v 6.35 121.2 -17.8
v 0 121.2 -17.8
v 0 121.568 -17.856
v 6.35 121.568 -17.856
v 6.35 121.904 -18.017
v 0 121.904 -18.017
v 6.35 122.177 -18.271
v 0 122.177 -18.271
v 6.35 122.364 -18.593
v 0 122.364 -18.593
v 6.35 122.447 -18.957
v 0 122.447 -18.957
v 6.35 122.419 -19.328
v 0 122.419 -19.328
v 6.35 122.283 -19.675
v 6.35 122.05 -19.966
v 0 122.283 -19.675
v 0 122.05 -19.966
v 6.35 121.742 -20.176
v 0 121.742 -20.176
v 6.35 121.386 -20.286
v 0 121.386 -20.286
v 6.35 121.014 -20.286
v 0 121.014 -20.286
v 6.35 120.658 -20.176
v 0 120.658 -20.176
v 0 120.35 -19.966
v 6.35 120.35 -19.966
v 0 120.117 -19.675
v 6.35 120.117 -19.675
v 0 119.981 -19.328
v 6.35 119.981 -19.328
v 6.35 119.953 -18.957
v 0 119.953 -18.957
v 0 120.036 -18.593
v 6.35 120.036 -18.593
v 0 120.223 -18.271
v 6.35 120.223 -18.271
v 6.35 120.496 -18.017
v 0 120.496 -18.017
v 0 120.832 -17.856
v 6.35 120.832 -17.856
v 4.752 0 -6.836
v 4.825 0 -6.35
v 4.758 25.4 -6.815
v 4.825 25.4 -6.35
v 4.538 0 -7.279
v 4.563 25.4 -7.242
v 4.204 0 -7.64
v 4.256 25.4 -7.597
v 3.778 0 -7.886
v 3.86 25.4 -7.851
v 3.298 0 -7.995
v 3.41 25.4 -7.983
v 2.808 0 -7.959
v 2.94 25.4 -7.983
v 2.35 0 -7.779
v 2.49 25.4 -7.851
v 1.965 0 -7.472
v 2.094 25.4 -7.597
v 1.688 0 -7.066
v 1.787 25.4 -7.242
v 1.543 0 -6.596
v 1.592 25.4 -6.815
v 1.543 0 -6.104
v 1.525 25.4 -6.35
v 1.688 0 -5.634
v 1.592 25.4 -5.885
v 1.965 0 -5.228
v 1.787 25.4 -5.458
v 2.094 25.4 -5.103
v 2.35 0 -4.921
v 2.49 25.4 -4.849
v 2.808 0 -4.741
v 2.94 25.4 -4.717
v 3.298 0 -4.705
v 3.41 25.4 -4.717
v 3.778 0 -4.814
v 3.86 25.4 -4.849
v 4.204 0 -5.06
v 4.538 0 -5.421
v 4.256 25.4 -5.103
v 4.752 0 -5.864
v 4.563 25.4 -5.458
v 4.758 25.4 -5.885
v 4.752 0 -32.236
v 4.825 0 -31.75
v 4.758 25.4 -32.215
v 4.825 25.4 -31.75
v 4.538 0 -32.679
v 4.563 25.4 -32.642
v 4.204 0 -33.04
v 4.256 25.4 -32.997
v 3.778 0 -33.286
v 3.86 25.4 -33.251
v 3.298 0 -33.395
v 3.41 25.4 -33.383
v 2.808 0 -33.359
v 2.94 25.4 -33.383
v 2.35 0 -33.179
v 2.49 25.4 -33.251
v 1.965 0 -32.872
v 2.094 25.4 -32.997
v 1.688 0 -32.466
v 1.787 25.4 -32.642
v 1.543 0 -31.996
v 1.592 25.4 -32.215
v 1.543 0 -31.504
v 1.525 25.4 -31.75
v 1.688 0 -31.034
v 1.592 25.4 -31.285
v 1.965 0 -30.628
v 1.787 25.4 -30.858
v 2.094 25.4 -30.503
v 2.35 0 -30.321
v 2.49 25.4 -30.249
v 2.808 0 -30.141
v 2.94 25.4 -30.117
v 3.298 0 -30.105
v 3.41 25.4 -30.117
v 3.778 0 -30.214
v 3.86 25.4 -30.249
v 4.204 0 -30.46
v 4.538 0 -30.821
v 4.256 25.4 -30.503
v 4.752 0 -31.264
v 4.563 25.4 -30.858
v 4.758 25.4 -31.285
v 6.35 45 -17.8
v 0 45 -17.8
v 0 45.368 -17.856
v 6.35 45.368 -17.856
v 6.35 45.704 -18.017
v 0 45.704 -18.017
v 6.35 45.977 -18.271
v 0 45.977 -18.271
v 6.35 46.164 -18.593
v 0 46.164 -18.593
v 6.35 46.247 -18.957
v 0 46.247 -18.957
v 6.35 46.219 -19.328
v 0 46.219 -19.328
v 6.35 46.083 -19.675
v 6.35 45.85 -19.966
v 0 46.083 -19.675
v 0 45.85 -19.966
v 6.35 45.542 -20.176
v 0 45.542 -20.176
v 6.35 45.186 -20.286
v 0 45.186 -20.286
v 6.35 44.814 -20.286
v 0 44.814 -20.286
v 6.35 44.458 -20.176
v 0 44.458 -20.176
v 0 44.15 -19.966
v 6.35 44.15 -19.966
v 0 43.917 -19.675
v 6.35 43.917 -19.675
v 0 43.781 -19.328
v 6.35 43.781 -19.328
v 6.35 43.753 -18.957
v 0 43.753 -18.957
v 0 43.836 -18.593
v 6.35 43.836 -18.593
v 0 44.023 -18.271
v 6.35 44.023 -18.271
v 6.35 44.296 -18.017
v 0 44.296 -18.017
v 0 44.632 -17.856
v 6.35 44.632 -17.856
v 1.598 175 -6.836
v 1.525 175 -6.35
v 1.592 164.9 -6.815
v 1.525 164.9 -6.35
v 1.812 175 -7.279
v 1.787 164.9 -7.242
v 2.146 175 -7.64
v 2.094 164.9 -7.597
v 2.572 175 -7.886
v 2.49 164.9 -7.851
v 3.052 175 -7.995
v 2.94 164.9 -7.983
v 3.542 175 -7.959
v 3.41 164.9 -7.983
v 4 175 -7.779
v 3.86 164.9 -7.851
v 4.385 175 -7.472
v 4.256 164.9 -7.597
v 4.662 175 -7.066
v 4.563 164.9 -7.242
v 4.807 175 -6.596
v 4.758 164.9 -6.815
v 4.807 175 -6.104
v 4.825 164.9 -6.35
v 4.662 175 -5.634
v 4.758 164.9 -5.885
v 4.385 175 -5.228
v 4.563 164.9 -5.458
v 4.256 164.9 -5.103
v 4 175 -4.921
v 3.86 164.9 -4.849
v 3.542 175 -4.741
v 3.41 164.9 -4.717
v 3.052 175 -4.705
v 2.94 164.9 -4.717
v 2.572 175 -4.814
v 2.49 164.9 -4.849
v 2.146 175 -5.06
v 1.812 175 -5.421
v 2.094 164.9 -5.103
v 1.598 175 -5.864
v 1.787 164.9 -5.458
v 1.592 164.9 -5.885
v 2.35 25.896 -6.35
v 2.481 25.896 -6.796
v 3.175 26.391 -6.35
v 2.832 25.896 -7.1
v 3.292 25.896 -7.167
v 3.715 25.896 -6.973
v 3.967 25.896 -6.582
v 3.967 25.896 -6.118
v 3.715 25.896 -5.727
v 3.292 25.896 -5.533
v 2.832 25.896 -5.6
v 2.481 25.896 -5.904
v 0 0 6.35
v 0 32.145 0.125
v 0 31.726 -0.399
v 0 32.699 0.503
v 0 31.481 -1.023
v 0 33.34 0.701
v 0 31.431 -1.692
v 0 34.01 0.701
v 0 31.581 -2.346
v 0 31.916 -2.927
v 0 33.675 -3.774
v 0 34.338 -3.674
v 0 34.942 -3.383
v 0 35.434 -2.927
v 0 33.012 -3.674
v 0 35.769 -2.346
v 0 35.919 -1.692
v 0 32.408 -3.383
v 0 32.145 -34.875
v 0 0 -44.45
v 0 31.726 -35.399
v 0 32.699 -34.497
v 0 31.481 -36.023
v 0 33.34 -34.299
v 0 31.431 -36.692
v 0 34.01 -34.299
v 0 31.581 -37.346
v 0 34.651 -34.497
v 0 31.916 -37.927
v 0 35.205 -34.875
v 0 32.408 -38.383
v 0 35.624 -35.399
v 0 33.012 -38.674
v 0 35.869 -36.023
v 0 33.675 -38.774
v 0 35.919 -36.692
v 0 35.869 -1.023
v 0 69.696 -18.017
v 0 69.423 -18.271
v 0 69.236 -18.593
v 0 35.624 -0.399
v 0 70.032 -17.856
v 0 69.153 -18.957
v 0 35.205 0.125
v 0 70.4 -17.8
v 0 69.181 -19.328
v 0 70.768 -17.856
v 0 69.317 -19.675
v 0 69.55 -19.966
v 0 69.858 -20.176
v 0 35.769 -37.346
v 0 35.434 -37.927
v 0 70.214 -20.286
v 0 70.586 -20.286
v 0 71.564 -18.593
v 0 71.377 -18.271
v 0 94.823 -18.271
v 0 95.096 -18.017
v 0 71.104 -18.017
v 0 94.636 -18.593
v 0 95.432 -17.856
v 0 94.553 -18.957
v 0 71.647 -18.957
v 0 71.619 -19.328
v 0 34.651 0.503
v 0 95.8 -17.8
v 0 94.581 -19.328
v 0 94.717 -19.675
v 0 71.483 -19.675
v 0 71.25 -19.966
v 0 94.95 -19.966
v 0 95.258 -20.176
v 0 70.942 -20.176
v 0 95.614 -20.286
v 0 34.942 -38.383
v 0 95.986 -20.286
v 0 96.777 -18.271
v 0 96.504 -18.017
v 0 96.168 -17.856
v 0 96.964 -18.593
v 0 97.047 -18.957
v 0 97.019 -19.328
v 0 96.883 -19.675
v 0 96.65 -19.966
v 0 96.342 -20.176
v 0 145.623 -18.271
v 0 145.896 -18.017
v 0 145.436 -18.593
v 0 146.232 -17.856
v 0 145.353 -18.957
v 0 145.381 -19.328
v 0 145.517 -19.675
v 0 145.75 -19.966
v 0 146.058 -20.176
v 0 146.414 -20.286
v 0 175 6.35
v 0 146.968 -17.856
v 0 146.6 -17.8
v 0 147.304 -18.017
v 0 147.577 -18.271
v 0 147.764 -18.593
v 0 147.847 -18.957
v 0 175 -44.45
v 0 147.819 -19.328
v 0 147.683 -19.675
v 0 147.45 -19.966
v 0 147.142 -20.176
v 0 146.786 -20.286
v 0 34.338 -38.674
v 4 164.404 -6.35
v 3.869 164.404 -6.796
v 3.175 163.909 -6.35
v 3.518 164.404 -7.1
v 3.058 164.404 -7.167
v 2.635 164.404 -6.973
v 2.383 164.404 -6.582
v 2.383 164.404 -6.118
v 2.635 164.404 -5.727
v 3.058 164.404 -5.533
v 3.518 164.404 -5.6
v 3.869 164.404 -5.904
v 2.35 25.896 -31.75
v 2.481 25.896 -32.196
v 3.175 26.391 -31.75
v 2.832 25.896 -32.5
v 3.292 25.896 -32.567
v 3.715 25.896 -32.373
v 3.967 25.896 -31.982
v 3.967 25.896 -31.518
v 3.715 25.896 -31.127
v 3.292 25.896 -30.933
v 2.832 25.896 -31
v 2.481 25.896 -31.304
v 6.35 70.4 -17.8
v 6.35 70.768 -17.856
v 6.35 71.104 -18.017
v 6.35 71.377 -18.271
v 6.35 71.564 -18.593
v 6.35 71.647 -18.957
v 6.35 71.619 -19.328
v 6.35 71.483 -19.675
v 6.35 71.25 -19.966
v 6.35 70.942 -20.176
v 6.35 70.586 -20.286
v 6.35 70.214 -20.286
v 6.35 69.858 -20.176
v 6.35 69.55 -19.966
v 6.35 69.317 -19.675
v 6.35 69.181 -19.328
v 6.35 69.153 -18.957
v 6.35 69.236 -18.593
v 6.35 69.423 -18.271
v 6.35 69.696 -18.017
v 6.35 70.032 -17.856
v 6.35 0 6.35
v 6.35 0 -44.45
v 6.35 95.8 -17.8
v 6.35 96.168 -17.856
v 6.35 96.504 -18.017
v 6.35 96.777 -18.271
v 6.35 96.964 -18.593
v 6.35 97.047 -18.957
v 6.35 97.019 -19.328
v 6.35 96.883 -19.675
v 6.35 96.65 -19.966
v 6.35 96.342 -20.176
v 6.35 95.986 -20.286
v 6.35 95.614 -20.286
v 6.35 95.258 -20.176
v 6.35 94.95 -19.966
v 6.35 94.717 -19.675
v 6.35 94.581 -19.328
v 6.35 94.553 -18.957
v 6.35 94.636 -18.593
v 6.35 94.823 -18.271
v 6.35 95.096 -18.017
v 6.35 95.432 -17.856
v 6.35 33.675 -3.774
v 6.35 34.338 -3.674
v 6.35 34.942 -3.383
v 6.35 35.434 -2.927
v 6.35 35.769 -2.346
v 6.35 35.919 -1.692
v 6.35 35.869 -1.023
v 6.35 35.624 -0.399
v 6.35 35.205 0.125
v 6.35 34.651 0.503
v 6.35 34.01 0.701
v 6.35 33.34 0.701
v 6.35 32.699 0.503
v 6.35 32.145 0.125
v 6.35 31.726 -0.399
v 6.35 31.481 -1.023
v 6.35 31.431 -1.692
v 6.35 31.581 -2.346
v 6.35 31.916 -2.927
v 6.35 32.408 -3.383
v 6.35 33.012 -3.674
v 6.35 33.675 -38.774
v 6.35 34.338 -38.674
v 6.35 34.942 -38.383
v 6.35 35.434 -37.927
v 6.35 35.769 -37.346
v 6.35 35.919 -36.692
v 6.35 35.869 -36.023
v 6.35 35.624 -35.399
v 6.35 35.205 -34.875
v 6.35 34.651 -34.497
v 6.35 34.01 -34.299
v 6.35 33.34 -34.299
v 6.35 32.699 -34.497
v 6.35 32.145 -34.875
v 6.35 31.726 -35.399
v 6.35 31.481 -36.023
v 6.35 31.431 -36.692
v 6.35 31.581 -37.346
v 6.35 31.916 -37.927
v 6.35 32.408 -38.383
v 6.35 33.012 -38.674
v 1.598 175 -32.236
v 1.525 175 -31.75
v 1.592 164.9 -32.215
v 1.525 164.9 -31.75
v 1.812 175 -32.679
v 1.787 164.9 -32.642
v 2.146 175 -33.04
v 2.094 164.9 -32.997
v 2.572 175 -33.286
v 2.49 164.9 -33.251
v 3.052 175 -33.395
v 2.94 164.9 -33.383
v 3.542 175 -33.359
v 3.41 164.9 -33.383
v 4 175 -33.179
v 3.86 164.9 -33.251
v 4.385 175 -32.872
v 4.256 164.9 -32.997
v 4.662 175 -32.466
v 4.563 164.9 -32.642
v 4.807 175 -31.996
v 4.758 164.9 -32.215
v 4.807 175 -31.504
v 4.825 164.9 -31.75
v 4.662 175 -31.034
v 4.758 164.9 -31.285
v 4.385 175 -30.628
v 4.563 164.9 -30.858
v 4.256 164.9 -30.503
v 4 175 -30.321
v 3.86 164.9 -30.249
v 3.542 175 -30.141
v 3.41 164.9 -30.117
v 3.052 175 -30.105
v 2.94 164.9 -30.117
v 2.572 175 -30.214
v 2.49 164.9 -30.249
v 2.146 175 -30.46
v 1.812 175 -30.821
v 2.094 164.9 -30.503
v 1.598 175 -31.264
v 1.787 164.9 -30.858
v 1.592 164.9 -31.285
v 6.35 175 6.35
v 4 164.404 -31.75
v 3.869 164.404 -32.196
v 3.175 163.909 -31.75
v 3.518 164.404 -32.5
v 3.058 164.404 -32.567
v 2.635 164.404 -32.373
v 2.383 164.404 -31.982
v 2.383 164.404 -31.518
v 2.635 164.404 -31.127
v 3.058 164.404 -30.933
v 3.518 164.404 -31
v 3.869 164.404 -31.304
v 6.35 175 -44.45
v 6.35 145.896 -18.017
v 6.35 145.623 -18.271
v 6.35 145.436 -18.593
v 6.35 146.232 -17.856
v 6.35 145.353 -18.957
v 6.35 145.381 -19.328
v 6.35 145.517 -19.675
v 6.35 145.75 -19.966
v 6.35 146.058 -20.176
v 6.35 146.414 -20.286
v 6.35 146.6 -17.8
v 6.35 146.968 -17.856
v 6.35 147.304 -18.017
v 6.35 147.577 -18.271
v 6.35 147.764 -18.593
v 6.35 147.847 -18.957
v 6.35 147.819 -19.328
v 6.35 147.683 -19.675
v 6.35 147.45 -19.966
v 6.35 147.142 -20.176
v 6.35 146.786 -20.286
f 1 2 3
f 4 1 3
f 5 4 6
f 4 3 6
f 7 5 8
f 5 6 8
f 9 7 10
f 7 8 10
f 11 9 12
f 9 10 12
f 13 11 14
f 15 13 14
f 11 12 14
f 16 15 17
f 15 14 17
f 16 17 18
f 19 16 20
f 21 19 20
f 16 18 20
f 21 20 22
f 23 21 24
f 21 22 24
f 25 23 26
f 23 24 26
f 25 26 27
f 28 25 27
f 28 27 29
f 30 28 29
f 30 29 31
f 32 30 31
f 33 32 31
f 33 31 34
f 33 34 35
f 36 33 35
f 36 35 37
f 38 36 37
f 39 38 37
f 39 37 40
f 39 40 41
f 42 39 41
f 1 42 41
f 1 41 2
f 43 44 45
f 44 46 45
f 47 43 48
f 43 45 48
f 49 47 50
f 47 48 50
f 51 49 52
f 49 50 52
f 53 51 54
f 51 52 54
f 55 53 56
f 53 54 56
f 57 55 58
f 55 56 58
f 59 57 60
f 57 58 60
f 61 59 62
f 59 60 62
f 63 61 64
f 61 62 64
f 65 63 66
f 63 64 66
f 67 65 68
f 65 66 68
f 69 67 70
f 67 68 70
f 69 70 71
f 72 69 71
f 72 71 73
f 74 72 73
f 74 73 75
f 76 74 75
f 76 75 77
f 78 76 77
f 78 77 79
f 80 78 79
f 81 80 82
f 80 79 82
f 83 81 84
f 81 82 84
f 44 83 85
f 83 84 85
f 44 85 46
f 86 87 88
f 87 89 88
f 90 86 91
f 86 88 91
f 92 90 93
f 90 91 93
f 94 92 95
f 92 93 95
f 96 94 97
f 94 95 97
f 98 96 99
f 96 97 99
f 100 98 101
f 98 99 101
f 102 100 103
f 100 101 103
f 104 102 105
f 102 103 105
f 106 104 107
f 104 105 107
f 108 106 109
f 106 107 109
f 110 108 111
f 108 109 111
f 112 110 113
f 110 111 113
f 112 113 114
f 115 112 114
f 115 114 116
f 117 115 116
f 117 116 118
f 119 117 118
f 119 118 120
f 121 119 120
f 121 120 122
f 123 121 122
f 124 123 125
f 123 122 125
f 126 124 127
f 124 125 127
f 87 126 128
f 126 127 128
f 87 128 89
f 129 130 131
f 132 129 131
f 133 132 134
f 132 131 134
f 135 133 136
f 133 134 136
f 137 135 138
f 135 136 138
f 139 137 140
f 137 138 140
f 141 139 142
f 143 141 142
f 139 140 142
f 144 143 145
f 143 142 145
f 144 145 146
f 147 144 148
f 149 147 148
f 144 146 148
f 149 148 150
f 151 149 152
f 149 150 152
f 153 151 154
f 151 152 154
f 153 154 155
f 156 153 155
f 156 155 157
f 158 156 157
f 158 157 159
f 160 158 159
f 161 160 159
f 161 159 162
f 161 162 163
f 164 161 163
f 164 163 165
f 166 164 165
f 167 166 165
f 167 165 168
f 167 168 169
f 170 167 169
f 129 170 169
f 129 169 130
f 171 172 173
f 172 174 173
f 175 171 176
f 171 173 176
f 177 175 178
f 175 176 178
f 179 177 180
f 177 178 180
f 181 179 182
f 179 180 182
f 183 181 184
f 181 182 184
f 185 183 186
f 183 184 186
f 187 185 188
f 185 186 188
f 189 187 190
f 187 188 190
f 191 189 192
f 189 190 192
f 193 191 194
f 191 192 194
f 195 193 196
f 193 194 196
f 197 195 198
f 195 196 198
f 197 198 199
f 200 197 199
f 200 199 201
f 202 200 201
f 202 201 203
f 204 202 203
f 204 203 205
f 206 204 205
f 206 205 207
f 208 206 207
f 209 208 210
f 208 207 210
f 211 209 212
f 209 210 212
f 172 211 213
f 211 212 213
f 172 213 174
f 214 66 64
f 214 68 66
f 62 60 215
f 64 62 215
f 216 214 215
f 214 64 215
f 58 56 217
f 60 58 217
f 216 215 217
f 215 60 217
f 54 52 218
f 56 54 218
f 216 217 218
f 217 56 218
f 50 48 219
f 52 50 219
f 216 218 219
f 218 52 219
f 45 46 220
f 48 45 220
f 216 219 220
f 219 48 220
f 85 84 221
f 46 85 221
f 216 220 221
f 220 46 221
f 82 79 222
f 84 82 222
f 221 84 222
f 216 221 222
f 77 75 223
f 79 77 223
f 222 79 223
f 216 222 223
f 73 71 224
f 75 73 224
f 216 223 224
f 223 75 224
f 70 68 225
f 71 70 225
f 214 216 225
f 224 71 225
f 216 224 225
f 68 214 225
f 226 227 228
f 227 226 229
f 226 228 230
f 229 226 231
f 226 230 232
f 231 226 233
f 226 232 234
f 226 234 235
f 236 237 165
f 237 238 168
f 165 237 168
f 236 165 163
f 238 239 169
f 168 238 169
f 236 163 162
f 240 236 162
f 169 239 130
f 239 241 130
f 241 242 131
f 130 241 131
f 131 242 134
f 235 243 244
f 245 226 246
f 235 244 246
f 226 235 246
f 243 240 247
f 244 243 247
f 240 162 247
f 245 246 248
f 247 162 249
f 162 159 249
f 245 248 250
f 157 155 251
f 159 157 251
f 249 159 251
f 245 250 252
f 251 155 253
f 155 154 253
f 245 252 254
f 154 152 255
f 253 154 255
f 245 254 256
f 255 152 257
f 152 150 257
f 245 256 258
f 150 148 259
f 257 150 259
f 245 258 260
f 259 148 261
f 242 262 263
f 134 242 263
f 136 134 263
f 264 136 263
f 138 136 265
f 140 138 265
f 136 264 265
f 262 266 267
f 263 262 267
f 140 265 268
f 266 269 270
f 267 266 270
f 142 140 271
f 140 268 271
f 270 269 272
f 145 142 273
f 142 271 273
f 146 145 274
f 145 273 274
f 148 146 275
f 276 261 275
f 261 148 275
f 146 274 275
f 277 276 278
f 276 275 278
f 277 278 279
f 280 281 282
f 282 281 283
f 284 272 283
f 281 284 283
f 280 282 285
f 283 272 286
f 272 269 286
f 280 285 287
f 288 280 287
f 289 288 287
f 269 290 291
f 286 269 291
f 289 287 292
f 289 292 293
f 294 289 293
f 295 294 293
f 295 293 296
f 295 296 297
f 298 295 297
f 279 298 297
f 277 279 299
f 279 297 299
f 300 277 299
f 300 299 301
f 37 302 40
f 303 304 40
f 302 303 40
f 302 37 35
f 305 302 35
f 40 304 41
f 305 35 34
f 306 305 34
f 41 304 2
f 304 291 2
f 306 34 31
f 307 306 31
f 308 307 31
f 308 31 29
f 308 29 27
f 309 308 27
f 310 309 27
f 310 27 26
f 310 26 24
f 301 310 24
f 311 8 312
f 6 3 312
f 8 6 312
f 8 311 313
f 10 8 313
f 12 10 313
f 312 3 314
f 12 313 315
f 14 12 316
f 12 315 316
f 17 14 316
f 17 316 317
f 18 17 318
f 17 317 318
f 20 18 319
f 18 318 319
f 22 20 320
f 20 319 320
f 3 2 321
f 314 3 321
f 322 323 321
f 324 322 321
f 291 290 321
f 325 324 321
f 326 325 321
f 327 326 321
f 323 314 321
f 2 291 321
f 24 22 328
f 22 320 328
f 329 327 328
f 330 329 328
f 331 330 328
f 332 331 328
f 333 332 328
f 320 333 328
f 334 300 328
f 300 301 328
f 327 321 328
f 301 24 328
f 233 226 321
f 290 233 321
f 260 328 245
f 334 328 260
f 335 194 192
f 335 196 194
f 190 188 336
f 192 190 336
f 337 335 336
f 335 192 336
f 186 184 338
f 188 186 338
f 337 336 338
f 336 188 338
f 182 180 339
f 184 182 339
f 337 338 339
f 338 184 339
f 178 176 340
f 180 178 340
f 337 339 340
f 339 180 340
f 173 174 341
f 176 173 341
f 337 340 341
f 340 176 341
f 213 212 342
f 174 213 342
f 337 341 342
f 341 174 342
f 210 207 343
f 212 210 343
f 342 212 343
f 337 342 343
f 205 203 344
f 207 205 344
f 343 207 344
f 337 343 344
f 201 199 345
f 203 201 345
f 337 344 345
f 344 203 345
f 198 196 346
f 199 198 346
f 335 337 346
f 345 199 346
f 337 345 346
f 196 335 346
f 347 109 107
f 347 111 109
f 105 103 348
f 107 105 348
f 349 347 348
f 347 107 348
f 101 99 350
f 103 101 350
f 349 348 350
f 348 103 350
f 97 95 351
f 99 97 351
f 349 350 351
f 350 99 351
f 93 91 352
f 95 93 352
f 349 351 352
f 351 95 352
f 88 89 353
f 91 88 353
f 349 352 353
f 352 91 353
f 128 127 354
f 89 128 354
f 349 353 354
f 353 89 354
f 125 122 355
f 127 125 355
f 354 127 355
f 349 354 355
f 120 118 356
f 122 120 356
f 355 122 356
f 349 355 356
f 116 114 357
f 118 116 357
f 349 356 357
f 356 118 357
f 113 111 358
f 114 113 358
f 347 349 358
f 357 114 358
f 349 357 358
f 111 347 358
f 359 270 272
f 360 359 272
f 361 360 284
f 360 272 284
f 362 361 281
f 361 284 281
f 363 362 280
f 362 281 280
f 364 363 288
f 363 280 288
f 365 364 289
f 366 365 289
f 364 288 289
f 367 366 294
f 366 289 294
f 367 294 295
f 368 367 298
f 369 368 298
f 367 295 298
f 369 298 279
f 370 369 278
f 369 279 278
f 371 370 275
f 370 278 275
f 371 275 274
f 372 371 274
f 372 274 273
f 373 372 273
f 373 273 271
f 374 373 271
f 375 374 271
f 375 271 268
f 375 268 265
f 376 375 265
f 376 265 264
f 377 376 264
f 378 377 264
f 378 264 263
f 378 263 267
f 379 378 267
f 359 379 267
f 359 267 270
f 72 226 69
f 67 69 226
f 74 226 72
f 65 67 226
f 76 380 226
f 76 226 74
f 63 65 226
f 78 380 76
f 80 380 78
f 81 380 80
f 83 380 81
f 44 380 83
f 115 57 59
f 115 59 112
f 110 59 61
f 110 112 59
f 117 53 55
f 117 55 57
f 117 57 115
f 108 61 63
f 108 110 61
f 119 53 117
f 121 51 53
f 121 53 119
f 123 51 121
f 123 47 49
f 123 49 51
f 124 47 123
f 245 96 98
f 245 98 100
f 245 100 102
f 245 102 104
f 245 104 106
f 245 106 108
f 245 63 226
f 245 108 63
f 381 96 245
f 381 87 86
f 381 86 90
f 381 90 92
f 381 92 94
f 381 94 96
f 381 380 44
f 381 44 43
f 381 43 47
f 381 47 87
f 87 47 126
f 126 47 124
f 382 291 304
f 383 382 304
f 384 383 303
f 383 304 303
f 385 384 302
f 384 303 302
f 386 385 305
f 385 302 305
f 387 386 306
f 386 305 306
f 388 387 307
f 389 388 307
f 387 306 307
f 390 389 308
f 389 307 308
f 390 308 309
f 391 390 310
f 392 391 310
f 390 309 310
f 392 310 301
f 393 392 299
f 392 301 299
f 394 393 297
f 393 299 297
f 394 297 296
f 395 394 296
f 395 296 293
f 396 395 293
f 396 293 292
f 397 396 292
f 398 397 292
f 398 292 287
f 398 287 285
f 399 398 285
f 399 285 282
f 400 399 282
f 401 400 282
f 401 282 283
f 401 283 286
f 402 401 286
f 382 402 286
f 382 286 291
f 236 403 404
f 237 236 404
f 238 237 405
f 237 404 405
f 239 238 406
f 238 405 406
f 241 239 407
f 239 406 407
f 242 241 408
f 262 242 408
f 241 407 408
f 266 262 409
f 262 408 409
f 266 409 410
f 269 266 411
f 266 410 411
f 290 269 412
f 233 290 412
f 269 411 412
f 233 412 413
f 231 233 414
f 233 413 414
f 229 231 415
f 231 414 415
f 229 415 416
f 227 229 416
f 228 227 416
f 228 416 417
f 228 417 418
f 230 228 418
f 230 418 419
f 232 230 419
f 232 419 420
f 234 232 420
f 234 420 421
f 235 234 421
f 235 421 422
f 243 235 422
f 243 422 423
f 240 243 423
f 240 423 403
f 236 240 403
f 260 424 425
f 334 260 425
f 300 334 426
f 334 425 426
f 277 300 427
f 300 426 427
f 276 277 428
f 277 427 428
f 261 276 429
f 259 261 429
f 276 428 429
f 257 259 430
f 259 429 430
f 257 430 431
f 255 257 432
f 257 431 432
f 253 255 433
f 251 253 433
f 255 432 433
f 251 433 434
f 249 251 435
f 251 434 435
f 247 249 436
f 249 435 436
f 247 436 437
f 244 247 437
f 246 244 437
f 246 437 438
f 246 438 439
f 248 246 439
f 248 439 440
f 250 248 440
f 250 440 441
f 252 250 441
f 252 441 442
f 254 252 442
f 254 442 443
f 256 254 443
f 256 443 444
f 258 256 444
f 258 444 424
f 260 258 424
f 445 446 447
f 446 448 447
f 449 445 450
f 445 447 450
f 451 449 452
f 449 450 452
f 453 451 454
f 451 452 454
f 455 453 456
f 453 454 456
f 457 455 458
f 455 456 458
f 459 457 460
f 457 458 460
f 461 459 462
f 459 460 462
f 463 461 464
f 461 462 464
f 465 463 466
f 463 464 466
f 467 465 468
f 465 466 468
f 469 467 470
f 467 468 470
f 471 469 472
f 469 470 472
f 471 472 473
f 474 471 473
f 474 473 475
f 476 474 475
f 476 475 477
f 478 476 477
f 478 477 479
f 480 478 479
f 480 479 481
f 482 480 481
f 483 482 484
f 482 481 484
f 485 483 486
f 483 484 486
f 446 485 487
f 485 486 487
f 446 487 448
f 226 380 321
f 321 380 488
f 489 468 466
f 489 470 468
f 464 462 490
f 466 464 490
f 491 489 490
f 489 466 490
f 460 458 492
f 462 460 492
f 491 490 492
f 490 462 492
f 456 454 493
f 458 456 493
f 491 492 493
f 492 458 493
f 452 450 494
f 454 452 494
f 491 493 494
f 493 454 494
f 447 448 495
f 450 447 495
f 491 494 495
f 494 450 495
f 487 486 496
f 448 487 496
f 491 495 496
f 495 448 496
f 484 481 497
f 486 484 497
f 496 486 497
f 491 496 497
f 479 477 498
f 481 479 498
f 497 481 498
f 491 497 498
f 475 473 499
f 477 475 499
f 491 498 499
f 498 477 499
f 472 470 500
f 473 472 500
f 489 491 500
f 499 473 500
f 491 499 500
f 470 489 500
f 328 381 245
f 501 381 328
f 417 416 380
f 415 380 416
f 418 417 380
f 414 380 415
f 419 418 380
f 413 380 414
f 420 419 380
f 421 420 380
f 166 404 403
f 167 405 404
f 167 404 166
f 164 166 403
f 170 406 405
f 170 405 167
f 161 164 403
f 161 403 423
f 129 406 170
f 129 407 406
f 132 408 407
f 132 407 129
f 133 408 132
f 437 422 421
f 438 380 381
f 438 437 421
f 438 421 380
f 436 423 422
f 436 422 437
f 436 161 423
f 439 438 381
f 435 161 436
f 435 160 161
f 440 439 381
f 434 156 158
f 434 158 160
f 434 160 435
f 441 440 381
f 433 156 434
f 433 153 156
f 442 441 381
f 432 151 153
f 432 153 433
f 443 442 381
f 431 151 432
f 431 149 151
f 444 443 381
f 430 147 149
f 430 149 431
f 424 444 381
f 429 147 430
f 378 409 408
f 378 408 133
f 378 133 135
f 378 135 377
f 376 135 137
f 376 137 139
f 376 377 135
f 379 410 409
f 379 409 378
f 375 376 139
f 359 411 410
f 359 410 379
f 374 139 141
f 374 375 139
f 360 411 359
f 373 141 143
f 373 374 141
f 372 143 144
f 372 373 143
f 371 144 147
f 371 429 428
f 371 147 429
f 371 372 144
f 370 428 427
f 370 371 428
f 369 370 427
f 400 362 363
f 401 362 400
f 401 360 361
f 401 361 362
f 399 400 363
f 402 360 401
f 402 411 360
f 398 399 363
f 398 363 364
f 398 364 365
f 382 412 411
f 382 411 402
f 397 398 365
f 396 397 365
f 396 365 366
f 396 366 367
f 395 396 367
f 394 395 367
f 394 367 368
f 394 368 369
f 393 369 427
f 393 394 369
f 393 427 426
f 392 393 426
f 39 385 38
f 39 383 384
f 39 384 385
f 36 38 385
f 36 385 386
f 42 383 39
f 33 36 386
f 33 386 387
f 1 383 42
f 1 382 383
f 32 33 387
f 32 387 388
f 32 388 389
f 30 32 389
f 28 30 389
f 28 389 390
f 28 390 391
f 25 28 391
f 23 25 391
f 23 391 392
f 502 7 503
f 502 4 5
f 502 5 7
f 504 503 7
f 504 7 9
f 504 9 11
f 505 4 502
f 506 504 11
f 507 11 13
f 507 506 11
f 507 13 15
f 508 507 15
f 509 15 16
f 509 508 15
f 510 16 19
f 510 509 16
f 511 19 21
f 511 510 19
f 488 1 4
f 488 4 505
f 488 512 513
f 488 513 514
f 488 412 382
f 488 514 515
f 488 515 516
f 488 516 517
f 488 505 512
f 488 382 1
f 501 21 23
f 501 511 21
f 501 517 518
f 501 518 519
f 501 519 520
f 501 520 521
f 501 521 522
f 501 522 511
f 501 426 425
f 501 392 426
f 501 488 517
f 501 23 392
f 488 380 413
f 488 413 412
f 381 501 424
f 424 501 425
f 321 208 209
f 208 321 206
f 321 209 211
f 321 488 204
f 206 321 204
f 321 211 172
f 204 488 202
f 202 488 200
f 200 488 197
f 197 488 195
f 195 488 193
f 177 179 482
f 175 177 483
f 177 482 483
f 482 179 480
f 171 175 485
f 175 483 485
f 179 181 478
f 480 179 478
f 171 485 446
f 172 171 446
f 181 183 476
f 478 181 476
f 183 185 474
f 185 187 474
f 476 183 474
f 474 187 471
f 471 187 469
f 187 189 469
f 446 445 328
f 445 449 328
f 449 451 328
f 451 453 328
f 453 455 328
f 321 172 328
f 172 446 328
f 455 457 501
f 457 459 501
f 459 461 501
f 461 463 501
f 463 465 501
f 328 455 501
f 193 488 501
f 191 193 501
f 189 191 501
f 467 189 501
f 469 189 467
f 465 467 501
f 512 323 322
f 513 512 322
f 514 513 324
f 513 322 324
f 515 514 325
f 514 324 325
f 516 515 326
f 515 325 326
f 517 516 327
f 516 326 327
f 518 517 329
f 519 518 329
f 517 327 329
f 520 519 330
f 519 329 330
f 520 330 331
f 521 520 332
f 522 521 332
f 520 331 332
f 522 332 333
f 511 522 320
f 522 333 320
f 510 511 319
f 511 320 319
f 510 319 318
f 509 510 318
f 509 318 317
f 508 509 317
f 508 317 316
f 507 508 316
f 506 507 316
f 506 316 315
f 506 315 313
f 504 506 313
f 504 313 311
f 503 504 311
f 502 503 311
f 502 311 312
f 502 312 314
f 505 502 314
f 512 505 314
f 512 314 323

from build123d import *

# Parameters (mm, degrees)
SKETCH1_W                 = 6.35
SKETCH1_H                 = 38.1
BOSS_EXTRUDE1_DEPTH       = 175
M4X0_7_TAPPED_HOLE1_D     = 3.3
M4X0_7_TAPPED_HOLE1_DEPTH = 10.1
M4X0_7_TAPPED_HOLE1_TIP   = 0.991420021
M3X0_5_TAPPED_HOLE1_D     = 2.5
SKETCH9_W                 = 6.35
SKETCH9_H                 = 175
BOSS_EXTRUDE2_DEPTH       = 6.35
SKETCH8_R                 = 2.25
CUT_EXTRUDE1_DEPTH        = 181.668550113
M4X0_7_TAPPED_HOLE2_D     = 3.3
M4X0_7_TAPPED_HOLE2_DEPTH = 25.4
M4X0_7_TAPPED_HOLE2_TIP   = 0.991420021


with BuildPart() as part:
    # Sketch1 → Boss-Extrude1 (new body)
    with BuildSketch(Plane(origin=(0, 0, 0), x_dir=(1, 0, 0), z_dir=(0, 1, 0))):
        with Locations((3.175, 19.05)):
            Rectangle(SKETCH1_W, SKETCH1_H)
    extrude(amount=BOSS_EXTRUDE1_DEPTH)

    # M4x0.7 Tapped Hole1
    with Locations(Plane(origin=(0, 175, 0), x_dir=(1, 0, 0), z_dir=(0, 1, 0))):
        with Locations((3.175, 31.75), (3.175, 6.35)):
            Hole(M4X0_7_TAPPED_HOLE1_D / 2, depth=M4X0_7_TAPPED_HOLE1_DEPTH)
            with Locations((0, 0, -(M4X0_7_TAPPED_HOLE1_DEPTH + M4X0_7_TAPPED_HOLE1_TIP / 2))):  # 118° drill point
                Cone(0, M4X0_7_TAPPED_HOLE1_D / 2, M4X0_7_TAPPED_HOLE1_TIP, mode=Mode.SUBTRACT)

    # M3x0.5 Tapped Hole1 (through all)
    with Locations(Plane(origin=(6.35, 0, 0), x_dir=(0, 0, -1), z_dir=(1, 0, 0))):
        with Locations((19.05, 121.2), (19.05, 95.8), (19.05, 70.4), (19.05, 45), (19.05, 146.6)):
            Hole(M3X0_5_TAPPED_HOLE1_D / 2)

    # Sketch9 → Boss-Extrude2 (add)
    with BuildSketch(Plane(origin=(6.35, 0, 0), x_dir=(0, 0, -1), z_dir=(1, 0, 0))):
        with Locations((-3.175, 87.5)):
            Rectangle(SKETCH9_W, SKETCH9_H)
        with Locations((41.275, 87.5)):
            Rectangle(SKETCH9_W, SKETCH9_H)
    extrude(amount=-BOSS_EXTRUDE2_DEPTH)

    # Sketch8 → Cut-Extrude1 (cut, through all)
    with BuildSketch(Plane(origin=(6.35, 0, 0), x_dir=(0, 0, -1), z_dir=(1, 0, 0))):
        with Locations((36.524, 33.675)):
            Circle(SKETCH8_R)
        with Locations((1.524, 33.675)):
            Circle(SKETCH8_R)
    extrude(amount=-CUT_EXTRUDE1_DEPTH, mode=Mode.SUBTRACT)

    # M4x0.7 Tapped Hole2
    with Locations(Plane(origin=(0, 0, 0), x_dir=(-1, 0, 0), z_dir=(0, -1, 0))):
        with Locations((-3.175, 6.35), (-3.175, 31.75)):
            Hole(M4X0_7_TAPPED_HOLE2_D / 2, depth=M4X0_7_TAPPED_HOLE2_DEPTH)
            with Locations((0, 0, -(M4X0_7_TAPPED_HOLE2_DEPTH + M4X0_7_TAPPED_HOLE2_TIP / 2))):  # 118° drill point
                Cone(0, M4X0_7_TAPPED_HOLE2_D / 2, M4X0_7_TAPPED_HOLE2_TIP, mode=Mode.SUBTRACT)


solid = part.part
